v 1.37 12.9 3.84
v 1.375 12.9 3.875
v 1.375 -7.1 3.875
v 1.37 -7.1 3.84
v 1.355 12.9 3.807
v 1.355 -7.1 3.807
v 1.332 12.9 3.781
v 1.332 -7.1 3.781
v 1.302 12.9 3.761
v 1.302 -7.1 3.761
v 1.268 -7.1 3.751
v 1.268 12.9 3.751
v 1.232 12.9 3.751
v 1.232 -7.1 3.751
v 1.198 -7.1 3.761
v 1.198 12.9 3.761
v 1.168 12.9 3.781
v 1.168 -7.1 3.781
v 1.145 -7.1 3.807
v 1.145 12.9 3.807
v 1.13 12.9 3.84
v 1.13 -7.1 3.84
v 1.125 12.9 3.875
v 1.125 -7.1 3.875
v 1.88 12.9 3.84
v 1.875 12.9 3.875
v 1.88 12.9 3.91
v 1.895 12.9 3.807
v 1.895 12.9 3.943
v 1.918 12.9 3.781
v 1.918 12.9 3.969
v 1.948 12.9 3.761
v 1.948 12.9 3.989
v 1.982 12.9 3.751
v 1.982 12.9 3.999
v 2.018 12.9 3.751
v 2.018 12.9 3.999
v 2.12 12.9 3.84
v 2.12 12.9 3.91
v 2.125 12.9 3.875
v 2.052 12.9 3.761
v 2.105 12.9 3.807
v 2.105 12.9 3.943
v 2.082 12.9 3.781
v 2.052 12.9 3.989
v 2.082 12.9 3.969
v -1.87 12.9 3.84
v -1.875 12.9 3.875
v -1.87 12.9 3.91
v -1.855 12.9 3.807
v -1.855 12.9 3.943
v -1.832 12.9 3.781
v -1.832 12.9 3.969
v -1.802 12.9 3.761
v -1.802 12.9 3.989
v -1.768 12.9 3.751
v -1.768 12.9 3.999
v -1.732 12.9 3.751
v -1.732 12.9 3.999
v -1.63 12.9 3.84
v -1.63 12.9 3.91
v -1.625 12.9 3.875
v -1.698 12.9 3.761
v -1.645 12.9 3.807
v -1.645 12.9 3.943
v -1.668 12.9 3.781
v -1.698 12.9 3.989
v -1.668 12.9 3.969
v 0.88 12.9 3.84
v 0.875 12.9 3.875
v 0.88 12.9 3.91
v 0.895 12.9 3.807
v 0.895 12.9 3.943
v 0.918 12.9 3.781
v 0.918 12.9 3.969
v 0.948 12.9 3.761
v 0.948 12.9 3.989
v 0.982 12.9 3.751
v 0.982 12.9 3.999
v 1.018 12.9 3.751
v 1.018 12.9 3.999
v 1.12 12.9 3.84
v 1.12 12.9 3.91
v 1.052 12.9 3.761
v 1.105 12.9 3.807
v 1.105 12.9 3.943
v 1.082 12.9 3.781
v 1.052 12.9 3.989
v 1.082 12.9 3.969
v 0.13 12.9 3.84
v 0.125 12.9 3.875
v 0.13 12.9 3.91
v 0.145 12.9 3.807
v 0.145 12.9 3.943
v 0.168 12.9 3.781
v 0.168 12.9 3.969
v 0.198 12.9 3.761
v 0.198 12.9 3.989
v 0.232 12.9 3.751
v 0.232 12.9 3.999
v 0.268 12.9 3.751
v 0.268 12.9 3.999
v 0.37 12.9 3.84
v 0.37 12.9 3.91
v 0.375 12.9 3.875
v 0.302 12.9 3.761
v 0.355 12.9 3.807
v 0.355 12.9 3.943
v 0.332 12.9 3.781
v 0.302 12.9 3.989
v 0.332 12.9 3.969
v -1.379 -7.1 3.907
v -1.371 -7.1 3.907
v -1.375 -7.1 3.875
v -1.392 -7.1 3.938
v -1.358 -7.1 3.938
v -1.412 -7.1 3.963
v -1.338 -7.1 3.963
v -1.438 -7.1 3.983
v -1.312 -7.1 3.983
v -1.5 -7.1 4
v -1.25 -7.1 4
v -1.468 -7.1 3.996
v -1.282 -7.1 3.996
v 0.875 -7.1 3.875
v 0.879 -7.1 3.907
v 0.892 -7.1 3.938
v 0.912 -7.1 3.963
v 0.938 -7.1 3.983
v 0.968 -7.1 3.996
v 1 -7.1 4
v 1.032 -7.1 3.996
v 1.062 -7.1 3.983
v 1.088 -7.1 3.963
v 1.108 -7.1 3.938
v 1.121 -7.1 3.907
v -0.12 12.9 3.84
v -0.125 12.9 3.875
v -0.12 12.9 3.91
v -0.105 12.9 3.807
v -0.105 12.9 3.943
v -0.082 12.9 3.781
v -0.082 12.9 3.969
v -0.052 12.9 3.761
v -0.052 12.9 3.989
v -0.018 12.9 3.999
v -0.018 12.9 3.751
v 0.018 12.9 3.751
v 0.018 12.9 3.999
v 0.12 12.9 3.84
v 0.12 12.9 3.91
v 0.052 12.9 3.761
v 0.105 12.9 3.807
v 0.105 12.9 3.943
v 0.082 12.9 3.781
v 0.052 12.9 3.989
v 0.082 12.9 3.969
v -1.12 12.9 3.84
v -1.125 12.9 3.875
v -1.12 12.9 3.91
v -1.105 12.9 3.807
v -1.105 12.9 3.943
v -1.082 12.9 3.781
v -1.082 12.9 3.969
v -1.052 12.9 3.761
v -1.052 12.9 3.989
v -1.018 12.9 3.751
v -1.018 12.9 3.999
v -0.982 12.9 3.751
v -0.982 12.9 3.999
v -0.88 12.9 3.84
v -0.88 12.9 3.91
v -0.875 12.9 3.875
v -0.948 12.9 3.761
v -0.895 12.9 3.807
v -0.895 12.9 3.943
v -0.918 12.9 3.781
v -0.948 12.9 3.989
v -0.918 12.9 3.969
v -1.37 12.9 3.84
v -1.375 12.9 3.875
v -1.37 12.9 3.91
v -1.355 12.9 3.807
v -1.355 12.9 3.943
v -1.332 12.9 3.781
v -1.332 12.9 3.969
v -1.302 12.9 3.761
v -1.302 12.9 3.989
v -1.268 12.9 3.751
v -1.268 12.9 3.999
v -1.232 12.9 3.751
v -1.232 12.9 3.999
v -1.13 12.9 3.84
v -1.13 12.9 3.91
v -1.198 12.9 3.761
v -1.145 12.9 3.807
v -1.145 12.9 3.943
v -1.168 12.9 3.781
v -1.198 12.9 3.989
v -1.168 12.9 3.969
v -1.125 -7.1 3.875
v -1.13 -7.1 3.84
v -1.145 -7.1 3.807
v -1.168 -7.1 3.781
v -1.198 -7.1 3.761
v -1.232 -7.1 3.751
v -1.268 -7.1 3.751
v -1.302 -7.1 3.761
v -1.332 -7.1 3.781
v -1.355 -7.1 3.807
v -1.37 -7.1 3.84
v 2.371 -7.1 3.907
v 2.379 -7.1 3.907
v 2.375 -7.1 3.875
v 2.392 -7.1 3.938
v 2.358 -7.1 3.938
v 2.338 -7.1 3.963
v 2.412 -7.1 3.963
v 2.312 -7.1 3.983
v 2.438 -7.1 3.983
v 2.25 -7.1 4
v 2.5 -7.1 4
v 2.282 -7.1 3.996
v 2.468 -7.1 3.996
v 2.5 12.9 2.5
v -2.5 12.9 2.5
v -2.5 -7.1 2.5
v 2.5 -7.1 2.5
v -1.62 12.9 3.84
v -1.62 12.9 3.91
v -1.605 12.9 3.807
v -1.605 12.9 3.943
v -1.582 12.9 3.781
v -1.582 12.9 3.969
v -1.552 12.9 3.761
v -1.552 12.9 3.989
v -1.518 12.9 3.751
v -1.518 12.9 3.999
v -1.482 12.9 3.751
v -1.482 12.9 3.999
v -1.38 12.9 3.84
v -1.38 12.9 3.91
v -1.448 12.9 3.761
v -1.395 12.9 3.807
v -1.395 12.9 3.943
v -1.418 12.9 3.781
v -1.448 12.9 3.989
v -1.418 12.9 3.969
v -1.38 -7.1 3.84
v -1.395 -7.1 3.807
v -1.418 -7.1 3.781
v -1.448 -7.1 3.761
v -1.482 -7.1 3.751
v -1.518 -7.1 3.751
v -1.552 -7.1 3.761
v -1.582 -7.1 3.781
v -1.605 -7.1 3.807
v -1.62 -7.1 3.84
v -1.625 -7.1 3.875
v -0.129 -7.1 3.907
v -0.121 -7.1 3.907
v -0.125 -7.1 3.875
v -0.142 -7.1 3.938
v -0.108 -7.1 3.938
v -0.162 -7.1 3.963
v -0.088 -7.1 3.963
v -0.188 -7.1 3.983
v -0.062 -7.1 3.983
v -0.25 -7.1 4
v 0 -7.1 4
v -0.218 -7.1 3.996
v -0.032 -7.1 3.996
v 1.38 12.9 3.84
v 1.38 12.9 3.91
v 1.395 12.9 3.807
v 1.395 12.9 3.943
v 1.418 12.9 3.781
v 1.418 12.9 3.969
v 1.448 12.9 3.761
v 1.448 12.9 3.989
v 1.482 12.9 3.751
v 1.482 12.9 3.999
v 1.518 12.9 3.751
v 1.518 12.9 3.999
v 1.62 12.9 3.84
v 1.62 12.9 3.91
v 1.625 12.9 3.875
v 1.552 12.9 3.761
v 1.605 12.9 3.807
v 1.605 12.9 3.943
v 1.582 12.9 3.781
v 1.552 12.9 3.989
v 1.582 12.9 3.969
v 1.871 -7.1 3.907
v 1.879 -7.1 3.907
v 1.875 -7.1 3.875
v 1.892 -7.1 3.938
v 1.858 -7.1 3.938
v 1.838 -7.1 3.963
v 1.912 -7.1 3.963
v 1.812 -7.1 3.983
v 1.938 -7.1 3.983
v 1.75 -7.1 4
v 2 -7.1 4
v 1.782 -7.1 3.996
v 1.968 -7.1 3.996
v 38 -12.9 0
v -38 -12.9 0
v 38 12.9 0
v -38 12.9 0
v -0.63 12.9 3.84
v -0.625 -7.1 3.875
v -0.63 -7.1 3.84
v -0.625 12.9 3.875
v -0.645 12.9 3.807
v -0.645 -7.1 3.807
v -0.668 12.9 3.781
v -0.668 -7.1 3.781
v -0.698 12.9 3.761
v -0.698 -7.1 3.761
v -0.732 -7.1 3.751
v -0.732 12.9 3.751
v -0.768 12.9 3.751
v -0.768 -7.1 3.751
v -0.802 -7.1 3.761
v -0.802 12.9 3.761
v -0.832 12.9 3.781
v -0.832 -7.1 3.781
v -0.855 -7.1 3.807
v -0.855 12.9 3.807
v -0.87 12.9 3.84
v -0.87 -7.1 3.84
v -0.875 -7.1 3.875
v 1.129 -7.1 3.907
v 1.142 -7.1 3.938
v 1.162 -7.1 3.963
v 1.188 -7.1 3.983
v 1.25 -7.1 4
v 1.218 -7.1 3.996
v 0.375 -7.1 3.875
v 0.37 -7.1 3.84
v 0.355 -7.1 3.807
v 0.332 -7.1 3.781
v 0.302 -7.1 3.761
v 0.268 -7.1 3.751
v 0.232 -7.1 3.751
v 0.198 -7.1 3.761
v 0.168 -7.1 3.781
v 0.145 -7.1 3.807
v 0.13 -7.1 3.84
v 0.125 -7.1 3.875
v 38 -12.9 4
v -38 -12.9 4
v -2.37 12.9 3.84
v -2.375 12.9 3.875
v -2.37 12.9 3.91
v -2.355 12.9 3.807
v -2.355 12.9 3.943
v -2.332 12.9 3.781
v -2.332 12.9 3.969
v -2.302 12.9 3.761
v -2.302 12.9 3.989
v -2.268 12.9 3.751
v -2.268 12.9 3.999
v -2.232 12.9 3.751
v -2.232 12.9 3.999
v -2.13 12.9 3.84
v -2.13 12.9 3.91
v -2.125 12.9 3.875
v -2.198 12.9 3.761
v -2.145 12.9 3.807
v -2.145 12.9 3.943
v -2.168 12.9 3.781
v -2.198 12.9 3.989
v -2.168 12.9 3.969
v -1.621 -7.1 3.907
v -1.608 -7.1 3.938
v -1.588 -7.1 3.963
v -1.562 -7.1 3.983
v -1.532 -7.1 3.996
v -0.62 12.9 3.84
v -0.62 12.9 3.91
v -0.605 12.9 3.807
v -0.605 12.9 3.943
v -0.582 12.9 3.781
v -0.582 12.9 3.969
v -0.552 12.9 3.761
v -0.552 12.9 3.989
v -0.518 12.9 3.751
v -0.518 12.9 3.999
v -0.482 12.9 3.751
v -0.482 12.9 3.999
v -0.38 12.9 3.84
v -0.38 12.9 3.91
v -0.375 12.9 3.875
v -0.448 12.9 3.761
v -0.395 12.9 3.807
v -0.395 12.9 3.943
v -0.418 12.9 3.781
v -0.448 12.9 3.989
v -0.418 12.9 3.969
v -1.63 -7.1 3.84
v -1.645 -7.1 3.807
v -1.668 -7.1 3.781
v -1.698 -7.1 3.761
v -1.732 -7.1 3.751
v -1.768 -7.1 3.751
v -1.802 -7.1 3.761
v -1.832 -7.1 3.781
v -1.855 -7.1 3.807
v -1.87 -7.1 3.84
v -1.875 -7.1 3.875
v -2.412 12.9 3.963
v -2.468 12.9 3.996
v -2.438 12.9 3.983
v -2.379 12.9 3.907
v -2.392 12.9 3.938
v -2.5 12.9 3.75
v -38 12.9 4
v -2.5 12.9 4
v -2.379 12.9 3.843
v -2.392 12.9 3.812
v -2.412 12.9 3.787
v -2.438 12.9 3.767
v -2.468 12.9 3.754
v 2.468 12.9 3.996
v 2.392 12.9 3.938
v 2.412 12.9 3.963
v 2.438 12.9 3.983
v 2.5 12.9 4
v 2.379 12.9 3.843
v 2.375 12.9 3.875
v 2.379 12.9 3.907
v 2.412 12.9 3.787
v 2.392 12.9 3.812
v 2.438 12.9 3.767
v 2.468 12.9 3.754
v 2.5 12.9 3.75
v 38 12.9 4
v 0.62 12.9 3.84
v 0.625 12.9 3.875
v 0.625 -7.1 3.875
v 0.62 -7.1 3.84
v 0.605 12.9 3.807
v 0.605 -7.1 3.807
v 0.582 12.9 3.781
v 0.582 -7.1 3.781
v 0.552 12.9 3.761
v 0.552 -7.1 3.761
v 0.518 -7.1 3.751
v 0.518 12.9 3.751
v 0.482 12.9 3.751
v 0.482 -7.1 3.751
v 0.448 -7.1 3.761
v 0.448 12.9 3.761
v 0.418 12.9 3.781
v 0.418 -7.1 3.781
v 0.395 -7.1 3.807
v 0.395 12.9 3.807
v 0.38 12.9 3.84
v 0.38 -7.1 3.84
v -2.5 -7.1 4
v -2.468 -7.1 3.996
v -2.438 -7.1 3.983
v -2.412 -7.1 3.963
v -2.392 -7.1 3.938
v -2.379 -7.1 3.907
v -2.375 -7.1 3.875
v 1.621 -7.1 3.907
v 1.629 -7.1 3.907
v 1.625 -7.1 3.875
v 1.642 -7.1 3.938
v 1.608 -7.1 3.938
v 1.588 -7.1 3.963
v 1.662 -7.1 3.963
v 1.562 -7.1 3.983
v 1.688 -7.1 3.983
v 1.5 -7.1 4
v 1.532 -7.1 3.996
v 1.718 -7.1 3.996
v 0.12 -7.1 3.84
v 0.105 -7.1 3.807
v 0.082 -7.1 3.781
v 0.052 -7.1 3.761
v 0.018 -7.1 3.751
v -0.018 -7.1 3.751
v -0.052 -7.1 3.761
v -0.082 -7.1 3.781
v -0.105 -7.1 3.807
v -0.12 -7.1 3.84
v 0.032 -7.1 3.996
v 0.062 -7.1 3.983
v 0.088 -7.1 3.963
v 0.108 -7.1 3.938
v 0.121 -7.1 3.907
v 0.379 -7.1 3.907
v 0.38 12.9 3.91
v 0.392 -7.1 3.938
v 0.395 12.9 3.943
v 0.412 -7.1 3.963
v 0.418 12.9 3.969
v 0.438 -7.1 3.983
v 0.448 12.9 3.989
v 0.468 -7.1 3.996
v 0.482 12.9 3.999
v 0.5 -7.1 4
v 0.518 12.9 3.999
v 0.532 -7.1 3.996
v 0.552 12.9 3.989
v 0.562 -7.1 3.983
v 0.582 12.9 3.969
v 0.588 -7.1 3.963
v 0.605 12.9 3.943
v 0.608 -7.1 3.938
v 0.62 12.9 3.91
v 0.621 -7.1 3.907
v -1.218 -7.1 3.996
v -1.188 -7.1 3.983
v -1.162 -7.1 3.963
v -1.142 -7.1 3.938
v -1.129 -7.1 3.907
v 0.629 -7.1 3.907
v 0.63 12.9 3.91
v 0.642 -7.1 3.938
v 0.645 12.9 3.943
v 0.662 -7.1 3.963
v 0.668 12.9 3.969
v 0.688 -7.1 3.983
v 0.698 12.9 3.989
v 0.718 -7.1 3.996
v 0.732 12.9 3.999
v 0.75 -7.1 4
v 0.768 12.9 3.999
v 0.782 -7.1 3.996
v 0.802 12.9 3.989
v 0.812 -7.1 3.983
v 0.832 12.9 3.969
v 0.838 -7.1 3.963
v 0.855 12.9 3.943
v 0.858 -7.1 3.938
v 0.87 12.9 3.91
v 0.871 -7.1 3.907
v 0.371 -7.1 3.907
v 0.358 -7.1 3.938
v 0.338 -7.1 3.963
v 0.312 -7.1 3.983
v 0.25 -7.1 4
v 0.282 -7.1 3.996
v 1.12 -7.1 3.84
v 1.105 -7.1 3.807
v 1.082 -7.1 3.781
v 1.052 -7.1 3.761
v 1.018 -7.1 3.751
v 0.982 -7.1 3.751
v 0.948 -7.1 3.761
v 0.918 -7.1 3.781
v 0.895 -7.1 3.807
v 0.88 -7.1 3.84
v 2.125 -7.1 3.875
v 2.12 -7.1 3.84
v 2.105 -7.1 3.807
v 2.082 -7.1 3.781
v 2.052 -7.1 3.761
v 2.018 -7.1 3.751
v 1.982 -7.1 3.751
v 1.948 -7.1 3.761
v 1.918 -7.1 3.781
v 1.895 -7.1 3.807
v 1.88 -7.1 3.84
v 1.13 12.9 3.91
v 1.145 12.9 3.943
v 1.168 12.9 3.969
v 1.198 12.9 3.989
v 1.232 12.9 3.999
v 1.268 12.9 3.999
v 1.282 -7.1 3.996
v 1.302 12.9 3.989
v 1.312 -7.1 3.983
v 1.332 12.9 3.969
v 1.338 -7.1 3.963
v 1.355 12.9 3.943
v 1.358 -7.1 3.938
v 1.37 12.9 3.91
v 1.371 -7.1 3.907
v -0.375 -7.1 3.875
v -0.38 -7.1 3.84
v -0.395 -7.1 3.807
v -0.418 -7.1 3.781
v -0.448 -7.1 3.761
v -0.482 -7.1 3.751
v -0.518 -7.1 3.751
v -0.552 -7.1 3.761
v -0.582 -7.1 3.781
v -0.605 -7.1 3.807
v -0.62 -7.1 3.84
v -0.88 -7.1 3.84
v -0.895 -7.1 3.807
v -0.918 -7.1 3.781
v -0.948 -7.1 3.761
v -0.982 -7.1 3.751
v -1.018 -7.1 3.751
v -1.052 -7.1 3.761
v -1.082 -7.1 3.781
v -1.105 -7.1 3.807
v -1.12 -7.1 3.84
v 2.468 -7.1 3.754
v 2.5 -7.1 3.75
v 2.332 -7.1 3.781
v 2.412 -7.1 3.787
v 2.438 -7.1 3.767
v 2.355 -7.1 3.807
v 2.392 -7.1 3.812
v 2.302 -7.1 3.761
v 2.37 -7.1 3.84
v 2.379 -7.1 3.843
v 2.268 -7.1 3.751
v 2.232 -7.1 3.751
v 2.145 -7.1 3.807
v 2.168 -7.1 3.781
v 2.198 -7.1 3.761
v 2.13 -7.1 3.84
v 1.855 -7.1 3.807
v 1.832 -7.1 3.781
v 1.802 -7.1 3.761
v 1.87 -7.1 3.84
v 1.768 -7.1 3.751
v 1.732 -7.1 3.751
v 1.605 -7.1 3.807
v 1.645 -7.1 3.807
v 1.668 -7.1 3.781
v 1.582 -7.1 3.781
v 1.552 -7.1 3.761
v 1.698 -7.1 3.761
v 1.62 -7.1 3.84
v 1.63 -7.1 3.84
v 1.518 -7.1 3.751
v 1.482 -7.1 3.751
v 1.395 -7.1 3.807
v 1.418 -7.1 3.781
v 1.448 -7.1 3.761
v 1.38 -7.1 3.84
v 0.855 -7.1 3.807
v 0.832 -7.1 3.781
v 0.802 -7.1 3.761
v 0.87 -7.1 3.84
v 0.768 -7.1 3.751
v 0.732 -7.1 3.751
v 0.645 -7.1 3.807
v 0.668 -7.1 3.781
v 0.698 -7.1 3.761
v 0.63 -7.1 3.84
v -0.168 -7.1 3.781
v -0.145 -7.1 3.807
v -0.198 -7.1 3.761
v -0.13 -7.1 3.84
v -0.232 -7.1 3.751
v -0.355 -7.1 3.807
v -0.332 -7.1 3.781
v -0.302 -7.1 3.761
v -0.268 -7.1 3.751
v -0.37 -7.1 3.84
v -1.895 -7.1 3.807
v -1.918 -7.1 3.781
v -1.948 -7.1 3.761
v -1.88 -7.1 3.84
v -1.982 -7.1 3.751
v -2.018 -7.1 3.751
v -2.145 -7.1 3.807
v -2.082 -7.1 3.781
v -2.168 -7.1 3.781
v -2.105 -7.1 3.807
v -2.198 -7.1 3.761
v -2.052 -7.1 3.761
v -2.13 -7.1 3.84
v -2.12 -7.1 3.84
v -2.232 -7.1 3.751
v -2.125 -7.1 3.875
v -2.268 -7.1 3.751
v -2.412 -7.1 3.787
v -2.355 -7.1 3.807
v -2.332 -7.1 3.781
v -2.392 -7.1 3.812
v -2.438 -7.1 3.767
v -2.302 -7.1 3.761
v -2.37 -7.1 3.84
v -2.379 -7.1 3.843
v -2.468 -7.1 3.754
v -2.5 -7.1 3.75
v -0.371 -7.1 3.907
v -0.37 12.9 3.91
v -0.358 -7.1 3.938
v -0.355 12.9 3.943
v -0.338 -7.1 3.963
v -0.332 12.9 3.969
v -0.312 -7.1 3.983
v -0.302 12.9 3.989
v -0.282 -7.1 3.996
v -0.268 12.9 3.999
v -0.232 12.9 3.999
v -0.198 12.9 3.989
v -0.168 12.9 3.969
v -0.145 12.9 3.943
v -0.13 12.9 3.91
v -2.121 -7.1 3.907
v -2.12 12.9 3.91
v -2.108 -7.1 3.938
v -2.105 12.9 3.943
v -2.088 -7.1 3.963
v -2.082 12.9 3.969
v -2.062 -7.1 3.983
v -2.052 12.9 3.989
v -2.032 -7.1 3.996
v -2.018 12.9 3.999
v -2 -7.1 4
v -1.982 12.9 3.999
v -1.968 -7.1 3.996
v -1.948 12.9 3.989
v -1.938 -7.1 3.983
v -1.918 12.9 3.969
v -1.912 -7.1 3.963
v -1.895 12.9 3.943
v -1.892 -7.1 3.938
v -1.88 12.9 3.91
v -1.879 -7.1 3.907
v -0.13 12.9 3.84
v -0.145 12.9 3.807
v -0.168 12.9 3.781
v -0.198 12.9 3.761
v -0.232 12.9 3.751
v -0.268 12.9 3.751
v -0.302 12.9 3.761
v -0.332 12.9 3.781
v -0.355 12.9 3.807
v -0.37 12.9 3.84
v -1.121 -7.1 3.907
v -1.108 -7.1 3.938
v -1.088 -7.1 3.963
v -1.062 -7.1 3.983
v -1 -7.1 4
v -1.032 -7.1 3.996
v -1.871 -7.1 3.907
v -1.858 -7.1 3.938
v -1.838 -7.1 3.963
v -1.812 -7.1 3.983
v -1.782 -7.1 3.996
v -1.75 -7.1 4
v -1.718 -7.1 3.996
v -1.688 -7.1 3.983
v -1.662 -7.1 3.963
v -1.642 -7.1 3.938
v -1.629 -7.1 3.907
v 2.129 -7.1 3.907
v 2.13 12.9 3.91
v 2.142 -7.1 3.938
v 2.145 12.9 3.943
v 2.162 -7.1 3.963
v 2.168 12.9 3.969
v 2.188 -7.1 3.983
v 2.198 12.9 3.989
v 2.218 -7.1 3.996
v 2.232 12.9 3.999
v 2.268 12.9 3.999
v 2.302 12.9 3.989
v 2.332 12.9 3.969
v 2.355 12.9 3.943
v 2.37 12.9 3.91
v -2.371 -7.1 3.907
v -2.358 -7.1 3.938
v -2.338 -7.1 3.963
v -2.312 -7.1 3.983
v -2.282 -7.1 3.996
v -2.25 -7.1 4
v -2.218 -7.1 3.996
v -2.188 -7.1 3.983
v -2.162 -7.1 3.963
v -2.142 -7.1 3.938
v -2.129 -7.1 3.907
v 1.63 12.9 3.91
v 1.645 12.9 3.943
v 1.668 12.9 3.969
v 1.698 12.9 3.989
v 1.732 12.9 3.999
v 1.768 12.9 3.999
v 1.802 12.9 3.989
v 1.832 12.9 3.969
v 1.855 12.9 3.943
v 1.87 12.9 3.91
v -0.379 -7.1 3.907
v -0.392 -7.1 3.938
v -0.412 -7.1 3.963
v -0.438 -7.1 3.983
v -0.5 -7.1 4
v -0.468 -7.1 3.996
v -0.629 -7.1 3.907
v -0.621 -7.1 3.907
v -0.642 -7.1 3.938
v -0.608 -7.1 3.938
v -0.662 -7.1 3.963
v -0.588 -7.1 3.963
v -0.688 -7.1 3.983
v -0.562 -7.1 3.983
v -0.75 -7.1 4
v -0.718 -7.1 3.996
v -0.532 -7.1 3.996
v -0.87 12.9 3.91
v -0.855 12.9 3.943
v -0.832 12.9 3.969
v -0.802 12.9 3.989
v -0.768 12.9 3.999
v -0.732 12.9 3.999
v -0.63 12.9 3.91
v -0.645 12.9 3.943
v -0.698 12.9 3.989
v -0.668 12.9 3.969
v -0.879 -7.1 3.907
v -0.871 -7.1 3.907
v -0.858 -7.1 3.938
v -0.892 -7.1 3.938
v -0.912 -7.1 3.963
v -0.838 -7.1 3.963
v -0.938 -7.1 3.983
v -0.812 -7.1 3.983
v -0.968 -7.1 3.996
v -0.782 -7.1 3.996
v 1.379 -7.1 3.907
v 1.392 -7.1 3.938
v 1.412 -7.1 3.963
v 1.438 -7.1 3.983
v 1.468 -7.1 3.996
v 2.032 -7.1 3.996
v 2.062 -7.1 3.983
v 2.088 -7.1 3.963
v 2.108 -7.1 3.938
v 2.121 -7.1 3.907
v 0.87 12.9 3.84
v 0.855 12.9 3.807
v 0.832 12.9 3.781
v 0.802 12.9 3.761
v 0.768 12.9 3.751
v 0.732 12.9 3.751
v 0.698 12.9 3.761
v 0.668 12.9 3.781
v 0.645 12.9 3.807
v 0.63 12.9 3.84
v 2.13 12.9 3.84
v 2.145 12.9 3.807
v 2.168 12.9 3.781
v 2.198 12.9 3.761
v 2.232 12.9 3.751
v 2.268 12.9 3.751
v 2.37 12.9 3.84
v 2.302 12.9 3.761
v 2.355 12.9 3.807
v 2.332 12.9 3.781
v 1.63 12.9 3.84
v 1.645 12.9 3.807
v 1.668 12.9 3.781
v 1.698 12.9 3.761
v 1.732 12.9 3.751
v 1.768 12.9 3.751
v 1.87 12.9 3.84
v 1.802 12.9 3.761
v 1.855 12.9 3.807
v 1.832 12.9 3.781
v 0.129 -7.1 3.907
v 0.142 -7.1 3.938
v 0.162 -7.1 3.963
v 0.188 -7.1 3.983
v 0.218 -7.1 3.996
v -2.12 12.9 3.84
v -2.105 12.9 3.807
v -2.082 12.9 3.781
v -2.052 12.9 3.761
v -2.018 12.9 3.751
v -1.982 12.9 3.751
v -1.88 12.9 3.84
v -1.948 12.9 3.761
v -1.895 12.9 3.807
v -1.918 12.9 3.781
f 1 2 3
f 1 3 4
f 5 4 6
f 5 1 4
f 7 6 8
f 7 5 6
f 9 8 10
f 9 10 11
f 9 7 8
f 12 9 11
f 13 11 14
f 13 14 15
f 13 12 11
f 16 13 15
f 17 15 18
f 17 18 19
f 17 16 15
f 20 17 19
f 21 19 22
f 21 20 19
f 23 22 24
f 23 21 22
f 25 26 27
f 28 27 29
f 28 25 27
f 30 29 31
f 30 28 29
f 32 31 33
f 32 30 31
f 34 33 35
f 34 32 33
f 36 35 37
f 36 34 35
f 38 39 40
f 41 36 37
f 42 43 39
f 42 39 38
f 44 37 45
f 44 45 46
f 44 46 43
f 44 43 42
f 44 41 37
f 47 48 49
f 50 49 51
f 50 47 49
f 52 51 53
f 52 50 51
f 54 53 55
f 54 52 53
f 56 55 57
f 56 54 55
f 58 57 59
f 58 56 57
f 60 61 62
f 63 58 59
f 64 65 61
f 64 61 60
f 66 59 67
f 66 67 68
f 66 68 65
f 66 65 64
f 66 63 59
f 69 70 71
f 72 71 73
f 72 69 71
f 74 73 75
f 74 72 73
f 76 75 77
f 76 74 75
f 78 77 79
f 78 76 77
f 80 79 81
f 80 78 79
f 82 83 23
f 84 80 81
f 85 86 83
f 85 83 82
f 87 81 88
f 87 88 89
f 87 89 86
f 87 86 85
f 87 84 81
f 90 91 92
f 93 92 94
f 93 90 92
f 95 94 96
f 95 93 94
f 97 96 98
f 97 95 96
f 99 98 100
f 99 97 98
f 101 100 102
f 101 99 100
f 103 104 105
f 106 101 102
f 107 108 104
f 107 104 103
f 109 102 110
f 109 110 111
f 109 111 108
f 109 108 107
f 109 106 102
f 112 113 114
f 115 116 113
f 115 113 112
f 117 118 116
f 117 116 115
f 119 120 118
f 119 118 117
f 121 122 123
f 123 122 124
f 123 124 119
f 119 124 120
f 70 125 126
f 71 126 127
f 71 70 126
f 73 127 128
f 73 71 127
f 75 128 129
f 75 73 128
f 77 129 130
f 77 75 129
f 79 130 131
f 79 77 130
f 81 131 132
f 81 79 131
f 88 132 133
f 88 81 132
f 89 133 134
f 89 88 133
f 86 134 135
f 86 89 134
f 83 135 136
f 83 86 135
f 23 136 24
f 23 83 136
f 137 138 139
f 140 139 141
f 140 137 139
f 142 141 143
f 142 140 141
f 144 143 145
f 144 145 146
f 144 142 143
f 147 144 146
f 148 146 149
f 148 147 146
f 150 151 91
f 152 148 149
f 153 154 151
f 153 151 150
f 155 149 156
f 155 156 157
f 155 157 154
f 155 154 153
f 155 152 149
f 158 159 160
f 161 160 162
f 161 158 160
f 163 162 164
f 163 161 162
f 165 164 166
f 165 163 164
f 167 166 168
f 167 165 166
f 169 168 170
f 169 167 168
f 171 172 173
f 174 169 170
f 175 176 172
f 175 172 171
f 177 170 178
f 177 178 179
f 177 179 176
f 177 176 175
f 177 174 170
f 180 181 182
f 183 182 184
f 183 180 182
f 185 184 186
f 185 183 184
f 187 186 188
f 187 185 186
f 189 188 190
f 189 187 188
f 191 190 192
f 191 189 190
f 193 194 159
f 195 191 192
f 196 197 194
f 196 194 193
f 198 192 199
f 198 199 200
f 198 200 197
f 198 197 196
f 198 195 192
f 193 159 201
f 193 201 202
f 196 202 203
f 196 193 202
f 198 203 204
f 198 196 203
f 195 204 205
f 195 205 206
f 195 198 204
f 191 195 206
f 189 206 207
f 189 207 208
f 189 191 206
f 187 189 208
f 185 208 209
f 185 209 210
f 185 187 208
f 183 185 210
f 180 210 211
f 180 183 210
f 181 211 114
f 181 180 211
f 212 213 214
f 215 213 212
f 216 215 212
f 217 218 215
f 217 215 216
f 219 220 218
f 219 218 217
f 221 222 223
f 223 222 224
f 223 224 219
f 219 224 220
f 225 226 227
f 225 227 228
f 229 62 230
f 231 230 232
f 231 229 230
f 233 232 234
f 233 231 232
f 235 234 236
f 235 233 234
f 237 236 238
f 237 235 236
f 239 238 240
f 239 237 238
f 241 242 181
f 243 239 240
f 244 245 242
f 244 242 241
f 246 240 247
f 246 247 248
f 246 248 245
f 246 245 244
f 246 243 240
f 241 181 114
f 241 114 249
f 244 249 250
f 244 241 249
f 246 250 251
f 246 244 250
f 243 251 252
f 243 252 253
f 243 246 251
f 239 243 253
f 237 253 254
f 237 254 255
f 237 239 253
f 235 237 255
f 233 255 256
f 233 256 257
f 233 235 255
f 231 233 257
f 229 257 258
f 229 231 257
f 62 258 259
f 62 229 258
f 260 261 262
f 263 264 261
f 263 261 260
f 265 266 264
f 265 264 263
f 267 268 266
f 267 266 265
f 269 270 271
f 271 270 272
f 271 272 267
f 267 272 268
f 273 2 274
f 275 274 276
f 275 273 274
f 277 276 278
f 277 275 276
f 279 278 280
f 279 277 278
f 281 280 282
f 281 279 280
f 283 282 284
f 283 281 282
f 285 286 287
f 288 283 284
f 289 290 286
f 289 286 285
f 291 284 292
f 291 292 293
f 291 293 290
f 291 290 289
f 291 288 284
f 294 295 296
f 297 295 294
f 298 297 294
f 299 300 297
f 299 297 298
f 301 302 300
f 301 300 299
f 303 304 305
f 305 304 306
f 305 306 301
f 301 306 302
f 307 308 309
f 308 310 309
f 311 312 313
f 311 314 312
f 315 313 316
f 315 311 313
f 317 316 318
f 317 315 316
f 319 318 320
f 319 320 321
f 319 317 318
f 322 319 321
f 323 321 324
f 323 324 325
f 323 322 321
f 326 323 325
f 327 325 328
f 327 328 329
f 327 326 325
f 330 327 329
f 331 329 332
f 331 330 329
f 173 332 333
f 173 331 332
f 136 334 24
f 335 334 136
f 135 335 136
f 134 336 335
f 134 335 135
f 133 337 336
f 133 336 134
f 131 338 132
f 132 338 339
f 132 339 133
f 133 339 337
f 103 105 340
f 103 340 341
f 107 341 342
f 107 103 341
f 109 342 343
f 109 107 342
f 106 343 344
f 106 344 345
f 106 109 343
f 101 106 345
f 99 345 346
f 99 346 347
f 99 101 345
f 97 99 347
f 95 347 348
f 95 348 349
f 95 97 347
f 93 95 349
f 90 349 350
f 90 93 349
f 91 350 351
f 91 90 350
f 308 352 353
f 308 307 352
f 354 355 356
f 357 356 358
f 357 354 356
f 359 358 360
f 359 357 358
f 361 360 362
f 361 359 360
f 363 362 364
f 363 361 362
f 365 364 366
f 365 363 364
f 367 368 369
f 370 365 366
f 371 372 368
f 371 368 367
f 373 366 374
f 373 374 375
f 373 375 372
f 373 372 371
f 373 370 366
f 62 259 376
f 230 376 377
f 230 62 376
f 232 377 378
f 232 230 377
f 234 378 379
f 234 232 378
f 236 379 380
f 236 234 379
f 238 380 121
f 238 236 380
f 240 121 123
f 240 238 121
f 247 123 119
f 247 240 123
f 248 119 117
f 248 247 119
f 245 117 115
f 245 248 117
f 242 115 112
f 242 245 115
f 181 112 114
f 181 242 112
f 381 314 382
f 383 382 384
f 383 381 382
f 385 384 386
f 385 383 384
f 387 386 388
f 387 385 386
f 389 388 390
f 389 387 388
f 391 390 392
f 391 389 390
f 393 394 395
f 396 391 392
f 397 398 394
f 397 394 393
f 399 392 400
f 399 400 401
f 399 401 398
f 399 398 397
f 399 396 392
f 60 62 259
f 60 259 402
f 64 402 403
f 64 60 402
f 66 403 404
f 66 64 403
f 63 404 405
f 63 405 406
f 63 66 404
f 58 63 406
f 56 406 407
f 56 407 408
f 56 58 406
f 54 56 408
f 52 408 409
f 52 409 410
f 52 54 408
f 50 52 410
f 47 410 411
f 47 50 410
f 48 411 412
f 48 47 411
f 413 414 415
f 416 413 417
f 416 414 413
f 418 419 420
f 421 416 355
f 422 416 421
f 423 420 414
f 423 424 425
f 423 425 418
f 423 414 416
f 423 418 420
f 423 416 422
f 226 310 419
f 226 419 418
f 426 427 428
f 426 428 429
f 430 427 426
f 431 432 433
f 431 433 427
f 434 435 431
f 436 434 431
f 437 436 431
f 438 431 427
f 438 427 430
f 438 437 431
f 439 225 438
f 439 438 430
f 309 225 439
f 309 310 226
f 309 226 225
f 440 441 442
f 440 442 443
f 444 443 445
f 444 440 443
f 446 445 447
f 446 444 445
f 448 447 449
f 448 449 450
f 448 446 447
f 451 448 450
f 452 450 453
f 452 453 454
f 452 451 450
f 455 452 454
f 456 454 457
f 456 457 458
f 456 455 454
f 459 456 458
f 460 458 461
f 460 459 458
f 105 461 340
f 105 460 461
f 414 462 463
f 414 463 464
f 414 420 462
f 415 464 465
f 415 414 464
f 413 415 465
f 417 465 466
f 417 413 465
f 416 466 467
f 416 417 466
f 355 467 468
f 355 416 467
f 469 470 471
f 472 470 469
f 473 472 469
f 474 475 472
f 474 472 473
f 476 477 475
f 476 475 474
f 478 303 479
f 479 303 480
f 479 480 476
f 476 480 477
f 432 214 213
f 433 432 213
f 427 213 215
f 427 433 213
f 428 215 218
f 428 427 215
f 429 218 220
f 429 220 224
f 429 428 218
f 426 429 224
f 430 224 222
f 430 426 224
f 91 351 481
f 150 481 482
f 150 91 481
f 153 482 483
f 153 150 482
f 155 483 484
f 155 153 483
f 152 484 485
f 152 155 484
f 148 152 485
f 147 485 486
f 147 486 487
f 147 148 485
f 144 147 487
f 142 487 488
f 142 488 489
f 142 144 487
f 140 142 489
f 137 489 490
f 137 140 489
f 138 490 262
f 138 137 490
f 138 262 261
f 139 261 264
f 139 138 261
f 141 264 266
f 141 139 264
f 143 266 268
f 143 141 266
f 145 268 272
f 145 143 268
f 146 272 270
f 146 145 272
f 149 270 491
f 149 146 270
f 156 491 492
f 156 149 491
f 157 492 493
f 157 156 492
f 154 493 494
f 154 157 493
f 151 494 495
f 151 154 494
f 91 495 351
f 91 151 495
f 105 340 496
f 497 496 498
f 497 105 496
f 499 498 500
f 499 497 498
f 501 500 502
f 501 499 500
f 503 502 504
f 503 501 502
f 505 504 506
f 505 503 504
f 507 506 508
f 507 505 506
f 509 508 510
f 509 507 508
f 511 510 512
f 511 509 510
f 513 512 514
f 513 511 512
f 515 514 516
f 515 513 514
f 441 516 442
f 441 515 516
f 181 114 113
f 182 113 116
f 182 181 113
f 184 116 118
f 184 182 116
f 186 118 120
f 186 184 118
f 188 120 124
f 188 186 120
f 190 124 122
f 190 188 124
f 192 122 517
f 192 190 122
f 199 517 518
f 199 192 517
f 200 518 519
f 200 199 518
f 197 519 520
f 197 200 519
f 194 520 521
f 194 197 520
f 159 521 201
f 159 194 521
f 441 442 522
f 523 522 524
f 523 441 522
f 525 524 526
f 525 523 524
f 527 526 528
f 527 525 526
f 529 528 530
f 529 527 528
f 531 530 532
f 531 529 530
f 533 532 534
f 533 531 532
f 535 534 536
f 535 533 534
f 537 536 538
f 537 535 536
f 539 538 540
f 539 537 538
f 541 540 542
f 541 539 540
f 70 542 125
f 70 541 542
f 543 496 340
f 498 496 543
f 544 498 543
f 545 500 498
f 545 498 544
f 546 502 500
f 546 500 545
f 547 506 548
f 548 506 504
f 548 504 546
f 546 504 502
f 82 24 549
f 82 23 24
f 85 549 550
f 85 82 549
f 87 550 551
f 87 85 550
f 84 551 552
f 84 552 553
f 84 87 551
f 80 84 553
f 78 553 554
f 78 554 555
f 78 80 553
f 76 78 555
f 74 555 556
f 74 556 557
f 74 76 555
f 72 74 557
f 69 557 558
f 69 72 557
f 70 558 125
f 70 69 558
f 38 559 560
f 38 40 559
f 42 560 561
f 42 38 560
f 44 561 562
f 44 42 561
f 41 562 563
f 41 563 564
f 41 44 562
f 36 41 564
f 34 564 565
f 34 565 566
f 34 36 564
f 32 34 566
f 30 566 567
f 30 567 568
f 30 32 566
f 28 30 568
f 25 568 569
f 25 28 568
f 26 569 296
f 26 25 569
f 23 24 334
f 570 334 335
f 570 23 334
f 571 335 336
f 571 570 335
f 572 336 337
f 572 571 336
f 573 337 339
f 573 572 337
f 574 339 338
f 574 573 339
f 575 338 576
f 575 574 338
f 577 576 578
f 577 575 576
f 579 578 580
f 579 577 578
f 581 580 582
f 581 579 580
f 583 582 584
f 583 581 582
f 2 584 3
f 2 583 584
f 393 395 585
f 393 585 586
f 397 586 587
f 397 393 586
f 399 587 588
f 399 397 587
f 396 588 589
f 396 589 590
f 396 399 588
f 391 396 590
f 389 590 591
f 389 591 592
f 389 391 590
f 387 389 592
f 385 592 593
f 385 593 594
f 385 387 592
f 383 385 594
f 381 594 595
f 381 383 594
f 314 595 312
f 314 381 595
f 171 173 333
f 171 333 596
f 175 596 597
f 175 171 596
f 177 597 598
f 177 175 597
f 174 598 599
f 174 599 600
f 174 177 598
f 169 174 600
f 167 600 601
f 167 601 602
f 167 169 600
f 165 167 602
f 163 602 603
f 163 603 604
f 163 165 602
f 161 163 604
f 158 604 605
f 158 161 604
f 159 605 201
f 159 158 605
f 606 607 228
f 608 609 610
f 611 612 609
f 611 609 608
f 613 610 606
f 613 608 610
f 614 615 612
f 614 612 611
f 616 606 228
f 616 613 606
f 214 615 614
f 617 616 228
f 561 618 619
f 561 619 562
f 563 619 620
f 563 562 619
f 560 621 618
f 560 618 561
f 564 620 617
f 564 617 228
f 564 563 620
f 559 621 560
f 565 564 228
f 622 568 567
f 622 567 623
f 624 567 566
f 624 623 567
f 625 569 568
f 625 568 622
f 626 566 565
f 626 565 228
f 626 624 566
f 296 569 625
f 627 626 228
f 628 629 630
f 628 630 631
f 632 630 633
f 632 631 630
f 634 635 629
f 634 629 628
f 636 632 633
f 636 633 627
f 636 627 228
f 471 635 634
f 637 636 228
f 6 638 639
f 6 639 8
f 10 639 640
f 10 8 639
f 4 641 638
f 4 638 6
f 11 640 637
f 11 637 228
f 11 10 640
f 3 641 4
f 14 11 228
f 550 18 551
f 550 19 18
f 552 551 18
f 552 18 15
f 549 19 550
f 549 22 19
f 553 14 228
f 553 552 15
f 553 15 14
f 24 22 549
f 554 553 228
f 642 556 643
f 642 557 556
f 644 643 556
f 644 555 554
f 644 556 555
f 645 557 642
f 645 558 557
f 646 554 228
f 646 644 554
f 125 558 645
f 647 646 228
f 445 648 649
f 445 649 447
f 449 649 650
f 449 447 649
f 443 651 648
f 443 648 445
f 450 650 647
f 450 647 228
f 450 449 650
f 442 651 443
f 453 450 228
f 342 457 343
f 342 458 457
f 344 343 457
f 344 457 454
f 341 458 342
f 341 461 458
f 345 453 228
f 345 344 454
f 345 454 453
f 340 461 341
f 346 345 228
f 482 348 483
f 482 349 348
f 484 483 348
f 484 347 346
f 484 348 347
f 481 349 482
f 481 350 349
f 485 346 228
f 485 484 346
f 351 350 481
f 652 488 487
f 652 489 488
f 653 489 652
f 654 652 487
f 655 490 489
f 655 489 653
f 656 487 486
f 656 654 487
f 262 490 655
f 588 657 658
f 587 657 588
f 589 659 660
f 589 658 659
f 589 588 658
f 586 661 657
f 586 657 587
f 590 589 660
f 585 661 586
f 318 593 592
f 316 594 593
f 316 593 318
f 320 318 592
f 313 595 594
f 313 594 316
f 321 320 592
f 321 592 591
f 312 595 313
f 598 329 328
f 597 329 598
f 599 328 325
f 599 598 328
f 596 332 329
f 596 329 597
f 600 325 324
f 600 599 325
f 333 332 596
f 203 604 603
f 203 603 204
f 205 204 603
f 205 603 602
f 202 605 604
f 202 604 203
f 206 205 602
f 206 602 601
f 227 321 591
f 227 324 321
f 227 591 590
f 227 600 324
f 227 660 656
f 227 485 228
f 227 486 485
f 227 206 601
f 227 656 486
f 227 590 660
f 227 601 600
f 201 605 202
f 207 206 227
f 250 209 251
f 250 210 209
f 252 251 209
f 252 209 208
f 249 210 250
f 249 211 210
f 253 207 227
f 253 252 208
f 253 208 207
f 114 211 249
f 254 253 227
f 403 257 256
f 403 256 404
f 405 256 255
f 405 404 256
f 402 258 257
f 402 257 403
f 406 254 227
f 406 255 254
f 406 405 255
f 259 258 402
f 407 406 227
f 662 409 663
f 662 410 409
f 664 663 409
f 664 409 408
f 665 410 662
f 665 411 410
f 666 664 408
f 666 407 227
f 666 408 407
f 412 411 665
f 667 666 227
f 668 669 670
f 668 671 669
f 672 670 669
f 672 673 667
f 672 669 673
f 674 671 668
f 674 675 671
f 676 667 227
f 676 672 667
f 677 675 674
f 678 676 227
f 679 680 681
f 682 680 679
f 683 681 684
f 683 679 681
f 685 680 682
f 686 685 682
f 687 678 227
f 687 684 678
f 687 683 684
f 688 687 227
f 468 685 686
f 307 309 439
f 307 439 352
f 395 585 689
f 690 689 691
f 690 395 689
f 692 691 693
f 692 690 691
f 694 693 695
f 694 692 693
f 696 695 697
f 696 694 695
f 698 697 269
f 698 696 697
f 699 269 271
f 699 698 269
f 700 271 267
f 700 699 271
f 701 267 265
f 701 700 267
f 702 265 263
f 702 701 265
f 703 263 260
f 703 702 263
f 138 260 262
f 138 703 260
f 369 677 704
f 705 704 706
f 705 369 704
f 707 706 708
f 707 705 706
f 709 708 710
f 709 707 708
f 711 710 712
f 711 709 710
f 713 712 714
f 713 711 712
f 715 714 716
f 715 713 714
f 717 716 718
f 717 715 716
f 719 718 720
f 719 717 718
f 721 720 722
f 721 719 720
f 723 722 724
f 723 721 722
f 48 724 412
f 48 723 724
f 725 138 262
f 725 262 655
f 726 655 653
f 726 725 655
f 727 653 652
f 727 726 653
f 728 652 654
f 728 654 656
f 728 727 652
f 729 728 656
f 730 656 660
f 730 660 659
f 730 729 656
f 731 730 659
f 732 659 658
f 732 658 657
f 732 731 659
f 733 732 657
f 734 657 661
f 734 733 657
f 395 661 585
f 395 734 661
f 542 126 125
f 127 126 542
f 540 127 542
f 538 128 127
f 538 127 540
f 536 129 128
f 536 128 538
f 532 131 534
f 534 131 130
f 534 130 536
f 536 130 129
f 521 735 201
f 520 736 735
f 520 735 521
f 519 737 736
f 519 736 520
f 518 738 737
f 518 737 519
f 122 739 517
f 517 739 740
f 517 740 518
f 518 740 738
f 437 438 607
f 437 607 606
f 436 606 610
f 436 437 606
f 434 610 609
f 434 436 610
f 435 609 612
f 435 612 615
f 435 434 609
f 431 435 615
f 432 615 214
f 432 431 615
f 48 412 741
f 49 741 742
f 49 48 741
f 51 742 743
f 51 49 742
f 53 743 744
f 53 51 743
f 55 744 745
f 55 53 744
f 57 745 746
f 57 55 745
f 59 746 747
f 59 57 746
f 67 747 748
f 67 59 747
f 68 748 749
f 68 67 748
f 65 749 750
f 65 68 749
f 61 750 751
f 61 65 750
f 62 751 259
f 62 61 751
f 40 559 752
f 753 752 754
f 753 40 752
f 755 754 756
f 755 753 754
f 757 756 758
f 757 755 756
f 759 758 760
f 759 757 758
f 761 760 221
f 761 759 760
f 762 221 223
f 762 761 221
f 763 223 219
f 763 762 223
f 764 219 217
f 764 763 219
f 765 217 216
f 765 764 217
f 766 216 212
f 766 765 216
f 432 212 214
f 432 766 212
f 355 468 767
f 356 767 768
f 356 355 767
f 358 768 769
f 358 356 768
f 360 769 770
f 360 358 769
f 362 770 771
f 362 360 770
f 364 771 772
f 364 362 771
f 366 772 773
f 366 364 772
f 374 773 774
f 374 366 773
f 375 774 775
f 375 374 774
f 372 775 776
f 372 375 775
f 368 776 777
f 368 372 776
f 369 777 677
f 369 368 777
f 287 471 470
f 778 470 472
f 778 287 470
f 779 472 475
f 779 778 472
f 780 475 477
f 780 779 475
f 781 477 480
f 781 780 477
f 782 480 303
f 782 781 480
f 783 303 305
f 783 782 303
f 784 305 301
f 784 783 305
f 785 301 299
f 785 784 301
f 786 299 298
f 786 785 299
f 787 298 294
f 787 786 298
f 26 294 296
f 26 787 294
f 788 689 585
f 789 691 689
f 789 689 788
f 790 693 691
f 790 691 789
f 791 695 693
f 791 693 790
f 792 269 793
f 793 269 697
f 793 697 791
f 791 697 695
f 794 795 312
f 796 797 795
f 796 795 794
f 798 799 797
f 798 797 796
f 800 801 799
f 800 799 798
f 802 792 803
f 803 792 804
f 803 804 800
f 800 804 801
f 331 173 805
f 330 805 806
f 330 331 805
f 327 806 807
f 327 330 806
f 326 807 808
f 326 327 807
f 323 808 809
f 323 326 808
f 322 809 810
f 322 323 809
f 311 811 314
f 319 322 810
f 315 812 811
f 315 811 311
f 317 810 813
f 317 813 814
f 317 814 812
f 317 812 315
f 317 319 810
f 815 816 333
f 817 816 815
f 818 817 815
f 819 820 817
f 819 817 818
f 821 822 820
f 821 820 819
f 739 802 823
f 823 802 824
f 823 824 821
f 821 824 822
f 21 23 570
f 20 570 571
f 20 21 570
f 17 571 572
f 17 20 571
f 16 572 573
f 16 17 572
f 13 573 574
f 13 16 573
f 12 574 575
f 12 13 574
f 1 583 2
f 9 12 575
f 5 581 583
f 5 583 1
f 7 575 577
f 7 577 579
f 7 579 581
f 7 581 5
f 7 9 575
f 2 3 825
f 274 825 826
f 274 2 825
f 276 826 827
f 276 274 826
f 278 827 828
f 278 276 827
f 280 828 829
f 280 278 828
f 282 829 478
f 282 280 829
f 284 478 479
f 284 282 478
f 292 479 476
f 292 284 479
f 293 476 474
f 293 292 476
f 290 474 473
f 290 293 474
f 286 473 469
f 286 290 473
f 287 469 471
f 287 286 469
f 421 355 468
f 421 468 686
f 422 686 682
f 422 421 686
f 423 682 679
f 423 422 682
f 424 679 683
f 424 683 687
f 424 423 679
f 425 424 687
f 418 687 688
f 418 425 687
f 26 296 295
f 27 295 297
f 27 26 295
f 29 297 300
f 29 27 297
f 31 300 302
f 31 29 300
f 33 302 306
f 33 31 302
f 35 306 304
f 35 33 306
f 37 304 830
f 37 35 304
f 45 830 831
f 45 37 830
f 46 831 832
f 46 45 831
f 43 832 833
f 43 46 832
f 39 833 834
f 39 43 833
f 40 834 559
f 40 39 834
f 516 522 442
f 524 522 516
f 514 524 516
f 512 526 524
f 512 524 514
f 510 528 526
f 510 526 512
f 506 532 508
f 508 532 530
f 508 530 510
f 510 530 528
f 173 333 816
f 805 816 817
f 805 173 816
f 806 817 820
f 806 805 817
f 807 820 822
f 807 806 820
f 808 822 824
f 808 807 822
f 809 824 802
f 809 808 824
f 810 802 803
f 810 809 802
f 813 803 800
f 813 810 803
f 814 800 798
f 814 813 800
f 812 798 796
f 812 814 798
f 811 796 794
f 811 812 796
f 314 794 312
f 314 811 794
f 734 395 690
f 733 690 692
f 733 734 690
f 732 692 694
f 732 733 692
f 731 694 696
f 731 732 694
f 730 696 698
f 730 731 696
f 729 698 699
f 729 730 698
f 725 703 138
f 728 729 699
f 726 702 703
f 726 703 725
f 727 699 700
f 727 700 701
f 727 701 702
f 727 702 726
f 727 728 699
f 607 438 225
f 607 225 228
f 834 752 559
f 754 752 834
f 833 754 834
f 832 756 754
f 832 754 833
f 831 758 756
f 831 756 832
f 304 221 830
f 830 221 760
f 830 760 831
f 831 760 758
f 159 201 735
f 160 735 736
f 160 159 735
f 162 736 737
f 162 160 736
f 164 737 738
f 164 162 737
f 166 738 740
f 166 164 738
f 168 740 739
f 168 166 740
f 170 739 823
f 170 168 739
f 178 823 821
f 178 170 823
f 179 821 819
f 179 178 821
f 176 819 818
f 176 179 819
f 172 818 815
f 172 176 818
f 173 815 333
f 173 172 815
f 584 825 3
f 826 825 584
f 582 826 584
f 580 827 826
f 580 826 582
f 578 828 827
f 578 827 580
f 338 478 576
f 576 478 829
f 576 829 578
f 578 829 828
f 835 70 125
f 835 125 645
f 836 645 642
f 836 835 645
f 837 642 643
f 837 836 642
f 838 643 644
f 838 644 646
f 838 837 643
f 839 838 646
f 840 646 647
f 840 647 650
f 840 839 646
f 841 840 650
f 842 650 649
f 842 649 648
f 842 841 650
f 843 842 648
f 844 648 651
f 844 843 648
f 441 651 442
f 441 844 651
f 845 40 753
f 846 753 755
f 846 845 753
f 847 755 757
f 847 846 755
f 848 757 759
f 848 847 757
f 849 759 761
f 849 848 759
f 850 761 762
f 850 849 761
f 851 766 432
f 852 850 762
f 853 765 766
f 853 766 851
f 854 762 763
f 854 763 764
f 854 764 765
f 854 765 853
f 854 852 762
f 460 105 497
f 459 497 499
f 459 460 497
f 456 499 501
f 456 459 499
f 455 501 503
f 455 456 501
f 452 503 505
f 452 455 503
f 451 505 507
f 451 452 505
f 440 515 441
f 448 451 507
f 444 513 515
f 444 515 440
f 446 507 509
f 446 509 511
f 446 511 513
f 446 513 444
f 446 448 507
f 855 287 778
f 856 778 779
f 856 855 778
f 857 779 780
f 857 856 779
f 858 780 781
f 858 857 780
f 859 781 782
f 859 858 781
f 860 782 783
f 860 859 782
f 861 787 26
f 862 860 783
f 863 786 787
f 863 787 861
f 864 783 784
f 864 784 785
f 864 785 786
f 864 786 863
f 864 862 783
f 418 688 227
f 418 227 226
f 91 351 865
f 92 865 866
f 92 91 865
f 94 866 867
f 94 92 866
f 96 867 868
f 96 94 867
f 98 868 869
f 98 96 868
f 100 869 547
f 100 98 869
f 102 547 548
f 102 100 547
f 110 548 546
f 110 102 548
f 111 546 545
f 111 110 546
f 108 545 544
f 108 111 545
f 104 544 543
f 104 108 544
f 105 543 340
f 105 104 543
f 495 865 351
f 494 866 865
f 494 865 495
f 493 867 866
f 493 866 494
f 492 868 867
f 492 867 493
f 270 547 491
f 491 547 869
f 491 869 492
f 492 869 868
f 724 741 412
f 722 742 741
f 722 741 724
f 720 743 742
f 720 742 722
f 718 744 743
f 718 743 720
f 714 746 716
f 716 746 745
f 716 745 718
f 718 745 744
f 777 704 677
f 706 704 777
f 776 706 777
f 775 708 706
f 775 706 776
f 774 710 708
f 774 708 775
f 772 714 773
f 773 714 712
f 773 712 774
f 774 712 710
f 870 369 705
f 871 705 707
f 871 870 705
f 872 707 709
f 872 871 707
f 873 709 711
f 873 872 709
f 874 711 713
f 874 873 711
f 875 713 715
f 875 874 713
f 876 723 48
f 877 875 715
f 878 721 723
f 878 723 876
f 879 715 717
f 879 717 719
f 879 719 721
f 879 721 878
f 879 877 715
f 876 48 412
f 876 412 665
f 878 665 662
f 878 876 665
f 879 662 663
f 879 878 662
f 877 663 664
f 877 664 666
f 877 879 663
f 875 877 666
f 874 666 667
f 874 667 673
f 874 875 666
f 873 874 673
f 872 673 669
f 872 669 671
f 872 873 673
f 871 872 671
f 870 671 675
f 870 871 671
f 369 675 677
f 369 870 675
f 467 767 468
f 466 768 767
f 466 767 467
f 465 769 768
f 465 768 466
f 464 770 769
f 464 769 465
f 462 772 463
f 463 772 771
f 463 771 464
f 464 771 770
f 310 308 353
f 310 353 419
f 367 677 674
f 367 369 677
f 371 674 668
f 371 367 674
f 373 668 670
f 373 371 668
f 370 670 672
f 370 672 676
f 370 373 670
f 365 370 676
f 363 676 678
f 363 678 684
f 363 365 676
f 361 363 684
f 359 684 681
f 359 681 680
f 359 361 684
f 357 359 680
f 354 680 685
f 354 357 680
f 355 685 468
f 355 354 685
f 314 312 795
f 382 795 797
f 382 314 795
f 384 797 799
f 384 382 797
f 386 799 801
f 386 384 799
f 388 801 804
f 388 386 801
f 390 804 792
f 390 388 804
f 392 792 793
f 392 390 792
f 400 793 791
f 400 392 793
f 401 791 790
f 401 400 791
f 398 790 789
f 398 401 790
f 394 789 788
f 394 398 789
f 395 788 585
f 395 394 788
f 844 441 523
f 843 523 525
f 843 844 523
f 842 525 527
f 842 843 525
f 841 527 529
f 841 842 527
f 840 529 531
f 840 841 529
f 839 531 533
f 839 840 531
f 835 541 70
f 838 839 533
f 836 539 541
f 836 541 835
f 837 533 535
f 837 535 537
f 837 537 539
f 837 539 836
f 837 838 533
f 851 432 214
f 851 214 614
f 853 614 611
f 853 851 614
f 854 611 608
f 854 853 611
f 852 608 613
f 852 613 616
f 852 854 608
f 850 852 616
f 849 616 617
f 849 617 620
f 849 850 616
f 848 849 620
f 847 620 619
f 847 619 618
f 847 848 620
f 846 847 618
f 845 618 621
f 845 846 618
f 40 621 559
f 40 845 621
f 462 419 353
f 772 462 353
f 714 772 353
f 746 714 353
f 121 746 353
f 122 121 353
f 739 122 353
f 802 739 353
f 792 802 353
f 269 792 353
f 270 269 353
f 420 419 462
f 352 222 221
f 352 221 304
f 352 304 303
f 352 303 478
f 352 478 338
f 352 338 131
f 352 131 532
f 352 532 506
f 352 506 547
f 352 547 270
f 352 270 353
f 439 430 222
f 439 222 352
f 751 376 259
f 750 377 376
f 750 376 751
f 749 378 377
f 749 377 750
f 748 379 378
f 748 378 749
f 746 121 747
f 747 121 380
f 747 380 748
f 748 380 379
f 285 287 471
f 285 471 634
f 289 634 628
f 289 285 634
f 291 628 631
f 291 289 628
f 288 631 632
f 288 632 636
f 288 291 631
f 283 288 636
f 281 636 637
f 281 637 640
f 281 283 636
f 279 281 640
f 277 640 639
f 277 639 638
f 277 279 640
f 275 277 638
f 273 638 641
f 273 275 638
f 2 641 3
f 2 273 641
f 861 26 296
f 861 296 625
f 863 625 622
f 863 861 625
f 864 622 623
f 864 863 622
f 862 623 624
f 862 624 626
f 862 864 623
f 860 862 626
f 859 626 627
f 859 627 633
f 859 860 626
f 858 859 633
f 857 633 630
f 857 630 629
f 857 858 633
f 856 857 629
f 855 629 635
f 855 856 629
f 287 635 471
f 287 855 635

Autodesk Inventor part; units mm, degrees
ref_plane "YZ Plane" through (0, 0, 0) normal (1, 0, 0) x (0, 1, 0)
ref_plane "XZ Plane" through (0, 0, 0) normal (0, 1, 0) x (-1, 0, 0)
ref_plane "XY Plane" through (0, 0, 0) normal (0, 0, 1) x (1, 0, 0)
sketch "Skizze1" plane through (0, 0, 0) normal (0, 0, 1) x (1, 0, 0)
  line L0 (38, -12.9) -> (-38, -12.9)
  line L1 (-38, -12.9) -> (-38, 12.9)
  line L2 (-38, 12.9) -> (38, 12.9)
  line L3 (38, 12.9) -> (38, -12.9)
  line L4 (38, -12.9) -> (-38, 12.9) construction
  line L5 (-38, -12.9) -> (38, 12.9) construction
  point P0 (0, 0)
  dimension "d0" = 76
  dimension "d1" = 25.8
extrude "Extrusion1" add sketch "Skizze1" along normal blind 4
sketch "Skizze2" plane through (0, 0, 4) normal (0, 0, 1) x (1, 0, 0)
  line L0 (38, 12.9) -> (-38, 12.9) projected
  line L1 (-38, 12.9) -> (-38, -12.9) projected
  line L2 (-38, -12.9) -> (38, -12.9) projected
  line L3 (38, -12.9) -> (38, 12.9) projected
  line L4 (2.5, -7.1) -> (-2.5, -7.1)
  line L5 (-2.5, -7.1) -> (-2.5, 12.9)
  line L6 (-2.5, 12.9) -> (2.5, 12.9)
  line L7 (2.5, 12.9) -> (2.5, -7.1)
  line L8 (2.5, -7.1) -> (-2.5, 12.9) construction
  line L9 (-2.5, -7.1) -> (2.5, 12.9) construction
  point P0 (0, 0)
  point P1 (0, 2.9)
  point P2 (0, 12.9)
  dimension "d4" = 5
  dimension "d5" = 20
extrude "Extrusion2" cut sketch "Skizze2" against normal blind 1.5 contours L7 L4 L5 L0
sketch "Skizze3" plane through (-38, 12.9, 0) normal (0, 1, 0) x (1, 0, 0)
  line L0 (40.5, -4) -> (35.5, -4) projected
  line L1 (40.5, -4) -> (40.5, -2.5) projected
  line L2 (40.5, -2.5) -> (35.5, -2.5) projected
  line L3 (35.5, -4) -> (35.5, -2.5) projected
  circle A0 centre (38, -3.875) radius 0.125
  point P0 (38, 0)
  dimension "d8" = 0.25
extrude "Extrusion3" add sketch "Skizze3" against normal up to surface (20 mm away) contours A0
pattern_linear "Rechteckige Anordnung1" count 11 spacing 0.25 along (-1, 0, 0) count 11 spacing 0.25 along (1, 0, 0) of "Extrusion3"
ref_plane "Arbeitsebene1" through (0, -12.9, 0) normal (1, 0, 0) x (0, 0, -1)
properties part number "00_chipnano_waveguide_slidsize"
